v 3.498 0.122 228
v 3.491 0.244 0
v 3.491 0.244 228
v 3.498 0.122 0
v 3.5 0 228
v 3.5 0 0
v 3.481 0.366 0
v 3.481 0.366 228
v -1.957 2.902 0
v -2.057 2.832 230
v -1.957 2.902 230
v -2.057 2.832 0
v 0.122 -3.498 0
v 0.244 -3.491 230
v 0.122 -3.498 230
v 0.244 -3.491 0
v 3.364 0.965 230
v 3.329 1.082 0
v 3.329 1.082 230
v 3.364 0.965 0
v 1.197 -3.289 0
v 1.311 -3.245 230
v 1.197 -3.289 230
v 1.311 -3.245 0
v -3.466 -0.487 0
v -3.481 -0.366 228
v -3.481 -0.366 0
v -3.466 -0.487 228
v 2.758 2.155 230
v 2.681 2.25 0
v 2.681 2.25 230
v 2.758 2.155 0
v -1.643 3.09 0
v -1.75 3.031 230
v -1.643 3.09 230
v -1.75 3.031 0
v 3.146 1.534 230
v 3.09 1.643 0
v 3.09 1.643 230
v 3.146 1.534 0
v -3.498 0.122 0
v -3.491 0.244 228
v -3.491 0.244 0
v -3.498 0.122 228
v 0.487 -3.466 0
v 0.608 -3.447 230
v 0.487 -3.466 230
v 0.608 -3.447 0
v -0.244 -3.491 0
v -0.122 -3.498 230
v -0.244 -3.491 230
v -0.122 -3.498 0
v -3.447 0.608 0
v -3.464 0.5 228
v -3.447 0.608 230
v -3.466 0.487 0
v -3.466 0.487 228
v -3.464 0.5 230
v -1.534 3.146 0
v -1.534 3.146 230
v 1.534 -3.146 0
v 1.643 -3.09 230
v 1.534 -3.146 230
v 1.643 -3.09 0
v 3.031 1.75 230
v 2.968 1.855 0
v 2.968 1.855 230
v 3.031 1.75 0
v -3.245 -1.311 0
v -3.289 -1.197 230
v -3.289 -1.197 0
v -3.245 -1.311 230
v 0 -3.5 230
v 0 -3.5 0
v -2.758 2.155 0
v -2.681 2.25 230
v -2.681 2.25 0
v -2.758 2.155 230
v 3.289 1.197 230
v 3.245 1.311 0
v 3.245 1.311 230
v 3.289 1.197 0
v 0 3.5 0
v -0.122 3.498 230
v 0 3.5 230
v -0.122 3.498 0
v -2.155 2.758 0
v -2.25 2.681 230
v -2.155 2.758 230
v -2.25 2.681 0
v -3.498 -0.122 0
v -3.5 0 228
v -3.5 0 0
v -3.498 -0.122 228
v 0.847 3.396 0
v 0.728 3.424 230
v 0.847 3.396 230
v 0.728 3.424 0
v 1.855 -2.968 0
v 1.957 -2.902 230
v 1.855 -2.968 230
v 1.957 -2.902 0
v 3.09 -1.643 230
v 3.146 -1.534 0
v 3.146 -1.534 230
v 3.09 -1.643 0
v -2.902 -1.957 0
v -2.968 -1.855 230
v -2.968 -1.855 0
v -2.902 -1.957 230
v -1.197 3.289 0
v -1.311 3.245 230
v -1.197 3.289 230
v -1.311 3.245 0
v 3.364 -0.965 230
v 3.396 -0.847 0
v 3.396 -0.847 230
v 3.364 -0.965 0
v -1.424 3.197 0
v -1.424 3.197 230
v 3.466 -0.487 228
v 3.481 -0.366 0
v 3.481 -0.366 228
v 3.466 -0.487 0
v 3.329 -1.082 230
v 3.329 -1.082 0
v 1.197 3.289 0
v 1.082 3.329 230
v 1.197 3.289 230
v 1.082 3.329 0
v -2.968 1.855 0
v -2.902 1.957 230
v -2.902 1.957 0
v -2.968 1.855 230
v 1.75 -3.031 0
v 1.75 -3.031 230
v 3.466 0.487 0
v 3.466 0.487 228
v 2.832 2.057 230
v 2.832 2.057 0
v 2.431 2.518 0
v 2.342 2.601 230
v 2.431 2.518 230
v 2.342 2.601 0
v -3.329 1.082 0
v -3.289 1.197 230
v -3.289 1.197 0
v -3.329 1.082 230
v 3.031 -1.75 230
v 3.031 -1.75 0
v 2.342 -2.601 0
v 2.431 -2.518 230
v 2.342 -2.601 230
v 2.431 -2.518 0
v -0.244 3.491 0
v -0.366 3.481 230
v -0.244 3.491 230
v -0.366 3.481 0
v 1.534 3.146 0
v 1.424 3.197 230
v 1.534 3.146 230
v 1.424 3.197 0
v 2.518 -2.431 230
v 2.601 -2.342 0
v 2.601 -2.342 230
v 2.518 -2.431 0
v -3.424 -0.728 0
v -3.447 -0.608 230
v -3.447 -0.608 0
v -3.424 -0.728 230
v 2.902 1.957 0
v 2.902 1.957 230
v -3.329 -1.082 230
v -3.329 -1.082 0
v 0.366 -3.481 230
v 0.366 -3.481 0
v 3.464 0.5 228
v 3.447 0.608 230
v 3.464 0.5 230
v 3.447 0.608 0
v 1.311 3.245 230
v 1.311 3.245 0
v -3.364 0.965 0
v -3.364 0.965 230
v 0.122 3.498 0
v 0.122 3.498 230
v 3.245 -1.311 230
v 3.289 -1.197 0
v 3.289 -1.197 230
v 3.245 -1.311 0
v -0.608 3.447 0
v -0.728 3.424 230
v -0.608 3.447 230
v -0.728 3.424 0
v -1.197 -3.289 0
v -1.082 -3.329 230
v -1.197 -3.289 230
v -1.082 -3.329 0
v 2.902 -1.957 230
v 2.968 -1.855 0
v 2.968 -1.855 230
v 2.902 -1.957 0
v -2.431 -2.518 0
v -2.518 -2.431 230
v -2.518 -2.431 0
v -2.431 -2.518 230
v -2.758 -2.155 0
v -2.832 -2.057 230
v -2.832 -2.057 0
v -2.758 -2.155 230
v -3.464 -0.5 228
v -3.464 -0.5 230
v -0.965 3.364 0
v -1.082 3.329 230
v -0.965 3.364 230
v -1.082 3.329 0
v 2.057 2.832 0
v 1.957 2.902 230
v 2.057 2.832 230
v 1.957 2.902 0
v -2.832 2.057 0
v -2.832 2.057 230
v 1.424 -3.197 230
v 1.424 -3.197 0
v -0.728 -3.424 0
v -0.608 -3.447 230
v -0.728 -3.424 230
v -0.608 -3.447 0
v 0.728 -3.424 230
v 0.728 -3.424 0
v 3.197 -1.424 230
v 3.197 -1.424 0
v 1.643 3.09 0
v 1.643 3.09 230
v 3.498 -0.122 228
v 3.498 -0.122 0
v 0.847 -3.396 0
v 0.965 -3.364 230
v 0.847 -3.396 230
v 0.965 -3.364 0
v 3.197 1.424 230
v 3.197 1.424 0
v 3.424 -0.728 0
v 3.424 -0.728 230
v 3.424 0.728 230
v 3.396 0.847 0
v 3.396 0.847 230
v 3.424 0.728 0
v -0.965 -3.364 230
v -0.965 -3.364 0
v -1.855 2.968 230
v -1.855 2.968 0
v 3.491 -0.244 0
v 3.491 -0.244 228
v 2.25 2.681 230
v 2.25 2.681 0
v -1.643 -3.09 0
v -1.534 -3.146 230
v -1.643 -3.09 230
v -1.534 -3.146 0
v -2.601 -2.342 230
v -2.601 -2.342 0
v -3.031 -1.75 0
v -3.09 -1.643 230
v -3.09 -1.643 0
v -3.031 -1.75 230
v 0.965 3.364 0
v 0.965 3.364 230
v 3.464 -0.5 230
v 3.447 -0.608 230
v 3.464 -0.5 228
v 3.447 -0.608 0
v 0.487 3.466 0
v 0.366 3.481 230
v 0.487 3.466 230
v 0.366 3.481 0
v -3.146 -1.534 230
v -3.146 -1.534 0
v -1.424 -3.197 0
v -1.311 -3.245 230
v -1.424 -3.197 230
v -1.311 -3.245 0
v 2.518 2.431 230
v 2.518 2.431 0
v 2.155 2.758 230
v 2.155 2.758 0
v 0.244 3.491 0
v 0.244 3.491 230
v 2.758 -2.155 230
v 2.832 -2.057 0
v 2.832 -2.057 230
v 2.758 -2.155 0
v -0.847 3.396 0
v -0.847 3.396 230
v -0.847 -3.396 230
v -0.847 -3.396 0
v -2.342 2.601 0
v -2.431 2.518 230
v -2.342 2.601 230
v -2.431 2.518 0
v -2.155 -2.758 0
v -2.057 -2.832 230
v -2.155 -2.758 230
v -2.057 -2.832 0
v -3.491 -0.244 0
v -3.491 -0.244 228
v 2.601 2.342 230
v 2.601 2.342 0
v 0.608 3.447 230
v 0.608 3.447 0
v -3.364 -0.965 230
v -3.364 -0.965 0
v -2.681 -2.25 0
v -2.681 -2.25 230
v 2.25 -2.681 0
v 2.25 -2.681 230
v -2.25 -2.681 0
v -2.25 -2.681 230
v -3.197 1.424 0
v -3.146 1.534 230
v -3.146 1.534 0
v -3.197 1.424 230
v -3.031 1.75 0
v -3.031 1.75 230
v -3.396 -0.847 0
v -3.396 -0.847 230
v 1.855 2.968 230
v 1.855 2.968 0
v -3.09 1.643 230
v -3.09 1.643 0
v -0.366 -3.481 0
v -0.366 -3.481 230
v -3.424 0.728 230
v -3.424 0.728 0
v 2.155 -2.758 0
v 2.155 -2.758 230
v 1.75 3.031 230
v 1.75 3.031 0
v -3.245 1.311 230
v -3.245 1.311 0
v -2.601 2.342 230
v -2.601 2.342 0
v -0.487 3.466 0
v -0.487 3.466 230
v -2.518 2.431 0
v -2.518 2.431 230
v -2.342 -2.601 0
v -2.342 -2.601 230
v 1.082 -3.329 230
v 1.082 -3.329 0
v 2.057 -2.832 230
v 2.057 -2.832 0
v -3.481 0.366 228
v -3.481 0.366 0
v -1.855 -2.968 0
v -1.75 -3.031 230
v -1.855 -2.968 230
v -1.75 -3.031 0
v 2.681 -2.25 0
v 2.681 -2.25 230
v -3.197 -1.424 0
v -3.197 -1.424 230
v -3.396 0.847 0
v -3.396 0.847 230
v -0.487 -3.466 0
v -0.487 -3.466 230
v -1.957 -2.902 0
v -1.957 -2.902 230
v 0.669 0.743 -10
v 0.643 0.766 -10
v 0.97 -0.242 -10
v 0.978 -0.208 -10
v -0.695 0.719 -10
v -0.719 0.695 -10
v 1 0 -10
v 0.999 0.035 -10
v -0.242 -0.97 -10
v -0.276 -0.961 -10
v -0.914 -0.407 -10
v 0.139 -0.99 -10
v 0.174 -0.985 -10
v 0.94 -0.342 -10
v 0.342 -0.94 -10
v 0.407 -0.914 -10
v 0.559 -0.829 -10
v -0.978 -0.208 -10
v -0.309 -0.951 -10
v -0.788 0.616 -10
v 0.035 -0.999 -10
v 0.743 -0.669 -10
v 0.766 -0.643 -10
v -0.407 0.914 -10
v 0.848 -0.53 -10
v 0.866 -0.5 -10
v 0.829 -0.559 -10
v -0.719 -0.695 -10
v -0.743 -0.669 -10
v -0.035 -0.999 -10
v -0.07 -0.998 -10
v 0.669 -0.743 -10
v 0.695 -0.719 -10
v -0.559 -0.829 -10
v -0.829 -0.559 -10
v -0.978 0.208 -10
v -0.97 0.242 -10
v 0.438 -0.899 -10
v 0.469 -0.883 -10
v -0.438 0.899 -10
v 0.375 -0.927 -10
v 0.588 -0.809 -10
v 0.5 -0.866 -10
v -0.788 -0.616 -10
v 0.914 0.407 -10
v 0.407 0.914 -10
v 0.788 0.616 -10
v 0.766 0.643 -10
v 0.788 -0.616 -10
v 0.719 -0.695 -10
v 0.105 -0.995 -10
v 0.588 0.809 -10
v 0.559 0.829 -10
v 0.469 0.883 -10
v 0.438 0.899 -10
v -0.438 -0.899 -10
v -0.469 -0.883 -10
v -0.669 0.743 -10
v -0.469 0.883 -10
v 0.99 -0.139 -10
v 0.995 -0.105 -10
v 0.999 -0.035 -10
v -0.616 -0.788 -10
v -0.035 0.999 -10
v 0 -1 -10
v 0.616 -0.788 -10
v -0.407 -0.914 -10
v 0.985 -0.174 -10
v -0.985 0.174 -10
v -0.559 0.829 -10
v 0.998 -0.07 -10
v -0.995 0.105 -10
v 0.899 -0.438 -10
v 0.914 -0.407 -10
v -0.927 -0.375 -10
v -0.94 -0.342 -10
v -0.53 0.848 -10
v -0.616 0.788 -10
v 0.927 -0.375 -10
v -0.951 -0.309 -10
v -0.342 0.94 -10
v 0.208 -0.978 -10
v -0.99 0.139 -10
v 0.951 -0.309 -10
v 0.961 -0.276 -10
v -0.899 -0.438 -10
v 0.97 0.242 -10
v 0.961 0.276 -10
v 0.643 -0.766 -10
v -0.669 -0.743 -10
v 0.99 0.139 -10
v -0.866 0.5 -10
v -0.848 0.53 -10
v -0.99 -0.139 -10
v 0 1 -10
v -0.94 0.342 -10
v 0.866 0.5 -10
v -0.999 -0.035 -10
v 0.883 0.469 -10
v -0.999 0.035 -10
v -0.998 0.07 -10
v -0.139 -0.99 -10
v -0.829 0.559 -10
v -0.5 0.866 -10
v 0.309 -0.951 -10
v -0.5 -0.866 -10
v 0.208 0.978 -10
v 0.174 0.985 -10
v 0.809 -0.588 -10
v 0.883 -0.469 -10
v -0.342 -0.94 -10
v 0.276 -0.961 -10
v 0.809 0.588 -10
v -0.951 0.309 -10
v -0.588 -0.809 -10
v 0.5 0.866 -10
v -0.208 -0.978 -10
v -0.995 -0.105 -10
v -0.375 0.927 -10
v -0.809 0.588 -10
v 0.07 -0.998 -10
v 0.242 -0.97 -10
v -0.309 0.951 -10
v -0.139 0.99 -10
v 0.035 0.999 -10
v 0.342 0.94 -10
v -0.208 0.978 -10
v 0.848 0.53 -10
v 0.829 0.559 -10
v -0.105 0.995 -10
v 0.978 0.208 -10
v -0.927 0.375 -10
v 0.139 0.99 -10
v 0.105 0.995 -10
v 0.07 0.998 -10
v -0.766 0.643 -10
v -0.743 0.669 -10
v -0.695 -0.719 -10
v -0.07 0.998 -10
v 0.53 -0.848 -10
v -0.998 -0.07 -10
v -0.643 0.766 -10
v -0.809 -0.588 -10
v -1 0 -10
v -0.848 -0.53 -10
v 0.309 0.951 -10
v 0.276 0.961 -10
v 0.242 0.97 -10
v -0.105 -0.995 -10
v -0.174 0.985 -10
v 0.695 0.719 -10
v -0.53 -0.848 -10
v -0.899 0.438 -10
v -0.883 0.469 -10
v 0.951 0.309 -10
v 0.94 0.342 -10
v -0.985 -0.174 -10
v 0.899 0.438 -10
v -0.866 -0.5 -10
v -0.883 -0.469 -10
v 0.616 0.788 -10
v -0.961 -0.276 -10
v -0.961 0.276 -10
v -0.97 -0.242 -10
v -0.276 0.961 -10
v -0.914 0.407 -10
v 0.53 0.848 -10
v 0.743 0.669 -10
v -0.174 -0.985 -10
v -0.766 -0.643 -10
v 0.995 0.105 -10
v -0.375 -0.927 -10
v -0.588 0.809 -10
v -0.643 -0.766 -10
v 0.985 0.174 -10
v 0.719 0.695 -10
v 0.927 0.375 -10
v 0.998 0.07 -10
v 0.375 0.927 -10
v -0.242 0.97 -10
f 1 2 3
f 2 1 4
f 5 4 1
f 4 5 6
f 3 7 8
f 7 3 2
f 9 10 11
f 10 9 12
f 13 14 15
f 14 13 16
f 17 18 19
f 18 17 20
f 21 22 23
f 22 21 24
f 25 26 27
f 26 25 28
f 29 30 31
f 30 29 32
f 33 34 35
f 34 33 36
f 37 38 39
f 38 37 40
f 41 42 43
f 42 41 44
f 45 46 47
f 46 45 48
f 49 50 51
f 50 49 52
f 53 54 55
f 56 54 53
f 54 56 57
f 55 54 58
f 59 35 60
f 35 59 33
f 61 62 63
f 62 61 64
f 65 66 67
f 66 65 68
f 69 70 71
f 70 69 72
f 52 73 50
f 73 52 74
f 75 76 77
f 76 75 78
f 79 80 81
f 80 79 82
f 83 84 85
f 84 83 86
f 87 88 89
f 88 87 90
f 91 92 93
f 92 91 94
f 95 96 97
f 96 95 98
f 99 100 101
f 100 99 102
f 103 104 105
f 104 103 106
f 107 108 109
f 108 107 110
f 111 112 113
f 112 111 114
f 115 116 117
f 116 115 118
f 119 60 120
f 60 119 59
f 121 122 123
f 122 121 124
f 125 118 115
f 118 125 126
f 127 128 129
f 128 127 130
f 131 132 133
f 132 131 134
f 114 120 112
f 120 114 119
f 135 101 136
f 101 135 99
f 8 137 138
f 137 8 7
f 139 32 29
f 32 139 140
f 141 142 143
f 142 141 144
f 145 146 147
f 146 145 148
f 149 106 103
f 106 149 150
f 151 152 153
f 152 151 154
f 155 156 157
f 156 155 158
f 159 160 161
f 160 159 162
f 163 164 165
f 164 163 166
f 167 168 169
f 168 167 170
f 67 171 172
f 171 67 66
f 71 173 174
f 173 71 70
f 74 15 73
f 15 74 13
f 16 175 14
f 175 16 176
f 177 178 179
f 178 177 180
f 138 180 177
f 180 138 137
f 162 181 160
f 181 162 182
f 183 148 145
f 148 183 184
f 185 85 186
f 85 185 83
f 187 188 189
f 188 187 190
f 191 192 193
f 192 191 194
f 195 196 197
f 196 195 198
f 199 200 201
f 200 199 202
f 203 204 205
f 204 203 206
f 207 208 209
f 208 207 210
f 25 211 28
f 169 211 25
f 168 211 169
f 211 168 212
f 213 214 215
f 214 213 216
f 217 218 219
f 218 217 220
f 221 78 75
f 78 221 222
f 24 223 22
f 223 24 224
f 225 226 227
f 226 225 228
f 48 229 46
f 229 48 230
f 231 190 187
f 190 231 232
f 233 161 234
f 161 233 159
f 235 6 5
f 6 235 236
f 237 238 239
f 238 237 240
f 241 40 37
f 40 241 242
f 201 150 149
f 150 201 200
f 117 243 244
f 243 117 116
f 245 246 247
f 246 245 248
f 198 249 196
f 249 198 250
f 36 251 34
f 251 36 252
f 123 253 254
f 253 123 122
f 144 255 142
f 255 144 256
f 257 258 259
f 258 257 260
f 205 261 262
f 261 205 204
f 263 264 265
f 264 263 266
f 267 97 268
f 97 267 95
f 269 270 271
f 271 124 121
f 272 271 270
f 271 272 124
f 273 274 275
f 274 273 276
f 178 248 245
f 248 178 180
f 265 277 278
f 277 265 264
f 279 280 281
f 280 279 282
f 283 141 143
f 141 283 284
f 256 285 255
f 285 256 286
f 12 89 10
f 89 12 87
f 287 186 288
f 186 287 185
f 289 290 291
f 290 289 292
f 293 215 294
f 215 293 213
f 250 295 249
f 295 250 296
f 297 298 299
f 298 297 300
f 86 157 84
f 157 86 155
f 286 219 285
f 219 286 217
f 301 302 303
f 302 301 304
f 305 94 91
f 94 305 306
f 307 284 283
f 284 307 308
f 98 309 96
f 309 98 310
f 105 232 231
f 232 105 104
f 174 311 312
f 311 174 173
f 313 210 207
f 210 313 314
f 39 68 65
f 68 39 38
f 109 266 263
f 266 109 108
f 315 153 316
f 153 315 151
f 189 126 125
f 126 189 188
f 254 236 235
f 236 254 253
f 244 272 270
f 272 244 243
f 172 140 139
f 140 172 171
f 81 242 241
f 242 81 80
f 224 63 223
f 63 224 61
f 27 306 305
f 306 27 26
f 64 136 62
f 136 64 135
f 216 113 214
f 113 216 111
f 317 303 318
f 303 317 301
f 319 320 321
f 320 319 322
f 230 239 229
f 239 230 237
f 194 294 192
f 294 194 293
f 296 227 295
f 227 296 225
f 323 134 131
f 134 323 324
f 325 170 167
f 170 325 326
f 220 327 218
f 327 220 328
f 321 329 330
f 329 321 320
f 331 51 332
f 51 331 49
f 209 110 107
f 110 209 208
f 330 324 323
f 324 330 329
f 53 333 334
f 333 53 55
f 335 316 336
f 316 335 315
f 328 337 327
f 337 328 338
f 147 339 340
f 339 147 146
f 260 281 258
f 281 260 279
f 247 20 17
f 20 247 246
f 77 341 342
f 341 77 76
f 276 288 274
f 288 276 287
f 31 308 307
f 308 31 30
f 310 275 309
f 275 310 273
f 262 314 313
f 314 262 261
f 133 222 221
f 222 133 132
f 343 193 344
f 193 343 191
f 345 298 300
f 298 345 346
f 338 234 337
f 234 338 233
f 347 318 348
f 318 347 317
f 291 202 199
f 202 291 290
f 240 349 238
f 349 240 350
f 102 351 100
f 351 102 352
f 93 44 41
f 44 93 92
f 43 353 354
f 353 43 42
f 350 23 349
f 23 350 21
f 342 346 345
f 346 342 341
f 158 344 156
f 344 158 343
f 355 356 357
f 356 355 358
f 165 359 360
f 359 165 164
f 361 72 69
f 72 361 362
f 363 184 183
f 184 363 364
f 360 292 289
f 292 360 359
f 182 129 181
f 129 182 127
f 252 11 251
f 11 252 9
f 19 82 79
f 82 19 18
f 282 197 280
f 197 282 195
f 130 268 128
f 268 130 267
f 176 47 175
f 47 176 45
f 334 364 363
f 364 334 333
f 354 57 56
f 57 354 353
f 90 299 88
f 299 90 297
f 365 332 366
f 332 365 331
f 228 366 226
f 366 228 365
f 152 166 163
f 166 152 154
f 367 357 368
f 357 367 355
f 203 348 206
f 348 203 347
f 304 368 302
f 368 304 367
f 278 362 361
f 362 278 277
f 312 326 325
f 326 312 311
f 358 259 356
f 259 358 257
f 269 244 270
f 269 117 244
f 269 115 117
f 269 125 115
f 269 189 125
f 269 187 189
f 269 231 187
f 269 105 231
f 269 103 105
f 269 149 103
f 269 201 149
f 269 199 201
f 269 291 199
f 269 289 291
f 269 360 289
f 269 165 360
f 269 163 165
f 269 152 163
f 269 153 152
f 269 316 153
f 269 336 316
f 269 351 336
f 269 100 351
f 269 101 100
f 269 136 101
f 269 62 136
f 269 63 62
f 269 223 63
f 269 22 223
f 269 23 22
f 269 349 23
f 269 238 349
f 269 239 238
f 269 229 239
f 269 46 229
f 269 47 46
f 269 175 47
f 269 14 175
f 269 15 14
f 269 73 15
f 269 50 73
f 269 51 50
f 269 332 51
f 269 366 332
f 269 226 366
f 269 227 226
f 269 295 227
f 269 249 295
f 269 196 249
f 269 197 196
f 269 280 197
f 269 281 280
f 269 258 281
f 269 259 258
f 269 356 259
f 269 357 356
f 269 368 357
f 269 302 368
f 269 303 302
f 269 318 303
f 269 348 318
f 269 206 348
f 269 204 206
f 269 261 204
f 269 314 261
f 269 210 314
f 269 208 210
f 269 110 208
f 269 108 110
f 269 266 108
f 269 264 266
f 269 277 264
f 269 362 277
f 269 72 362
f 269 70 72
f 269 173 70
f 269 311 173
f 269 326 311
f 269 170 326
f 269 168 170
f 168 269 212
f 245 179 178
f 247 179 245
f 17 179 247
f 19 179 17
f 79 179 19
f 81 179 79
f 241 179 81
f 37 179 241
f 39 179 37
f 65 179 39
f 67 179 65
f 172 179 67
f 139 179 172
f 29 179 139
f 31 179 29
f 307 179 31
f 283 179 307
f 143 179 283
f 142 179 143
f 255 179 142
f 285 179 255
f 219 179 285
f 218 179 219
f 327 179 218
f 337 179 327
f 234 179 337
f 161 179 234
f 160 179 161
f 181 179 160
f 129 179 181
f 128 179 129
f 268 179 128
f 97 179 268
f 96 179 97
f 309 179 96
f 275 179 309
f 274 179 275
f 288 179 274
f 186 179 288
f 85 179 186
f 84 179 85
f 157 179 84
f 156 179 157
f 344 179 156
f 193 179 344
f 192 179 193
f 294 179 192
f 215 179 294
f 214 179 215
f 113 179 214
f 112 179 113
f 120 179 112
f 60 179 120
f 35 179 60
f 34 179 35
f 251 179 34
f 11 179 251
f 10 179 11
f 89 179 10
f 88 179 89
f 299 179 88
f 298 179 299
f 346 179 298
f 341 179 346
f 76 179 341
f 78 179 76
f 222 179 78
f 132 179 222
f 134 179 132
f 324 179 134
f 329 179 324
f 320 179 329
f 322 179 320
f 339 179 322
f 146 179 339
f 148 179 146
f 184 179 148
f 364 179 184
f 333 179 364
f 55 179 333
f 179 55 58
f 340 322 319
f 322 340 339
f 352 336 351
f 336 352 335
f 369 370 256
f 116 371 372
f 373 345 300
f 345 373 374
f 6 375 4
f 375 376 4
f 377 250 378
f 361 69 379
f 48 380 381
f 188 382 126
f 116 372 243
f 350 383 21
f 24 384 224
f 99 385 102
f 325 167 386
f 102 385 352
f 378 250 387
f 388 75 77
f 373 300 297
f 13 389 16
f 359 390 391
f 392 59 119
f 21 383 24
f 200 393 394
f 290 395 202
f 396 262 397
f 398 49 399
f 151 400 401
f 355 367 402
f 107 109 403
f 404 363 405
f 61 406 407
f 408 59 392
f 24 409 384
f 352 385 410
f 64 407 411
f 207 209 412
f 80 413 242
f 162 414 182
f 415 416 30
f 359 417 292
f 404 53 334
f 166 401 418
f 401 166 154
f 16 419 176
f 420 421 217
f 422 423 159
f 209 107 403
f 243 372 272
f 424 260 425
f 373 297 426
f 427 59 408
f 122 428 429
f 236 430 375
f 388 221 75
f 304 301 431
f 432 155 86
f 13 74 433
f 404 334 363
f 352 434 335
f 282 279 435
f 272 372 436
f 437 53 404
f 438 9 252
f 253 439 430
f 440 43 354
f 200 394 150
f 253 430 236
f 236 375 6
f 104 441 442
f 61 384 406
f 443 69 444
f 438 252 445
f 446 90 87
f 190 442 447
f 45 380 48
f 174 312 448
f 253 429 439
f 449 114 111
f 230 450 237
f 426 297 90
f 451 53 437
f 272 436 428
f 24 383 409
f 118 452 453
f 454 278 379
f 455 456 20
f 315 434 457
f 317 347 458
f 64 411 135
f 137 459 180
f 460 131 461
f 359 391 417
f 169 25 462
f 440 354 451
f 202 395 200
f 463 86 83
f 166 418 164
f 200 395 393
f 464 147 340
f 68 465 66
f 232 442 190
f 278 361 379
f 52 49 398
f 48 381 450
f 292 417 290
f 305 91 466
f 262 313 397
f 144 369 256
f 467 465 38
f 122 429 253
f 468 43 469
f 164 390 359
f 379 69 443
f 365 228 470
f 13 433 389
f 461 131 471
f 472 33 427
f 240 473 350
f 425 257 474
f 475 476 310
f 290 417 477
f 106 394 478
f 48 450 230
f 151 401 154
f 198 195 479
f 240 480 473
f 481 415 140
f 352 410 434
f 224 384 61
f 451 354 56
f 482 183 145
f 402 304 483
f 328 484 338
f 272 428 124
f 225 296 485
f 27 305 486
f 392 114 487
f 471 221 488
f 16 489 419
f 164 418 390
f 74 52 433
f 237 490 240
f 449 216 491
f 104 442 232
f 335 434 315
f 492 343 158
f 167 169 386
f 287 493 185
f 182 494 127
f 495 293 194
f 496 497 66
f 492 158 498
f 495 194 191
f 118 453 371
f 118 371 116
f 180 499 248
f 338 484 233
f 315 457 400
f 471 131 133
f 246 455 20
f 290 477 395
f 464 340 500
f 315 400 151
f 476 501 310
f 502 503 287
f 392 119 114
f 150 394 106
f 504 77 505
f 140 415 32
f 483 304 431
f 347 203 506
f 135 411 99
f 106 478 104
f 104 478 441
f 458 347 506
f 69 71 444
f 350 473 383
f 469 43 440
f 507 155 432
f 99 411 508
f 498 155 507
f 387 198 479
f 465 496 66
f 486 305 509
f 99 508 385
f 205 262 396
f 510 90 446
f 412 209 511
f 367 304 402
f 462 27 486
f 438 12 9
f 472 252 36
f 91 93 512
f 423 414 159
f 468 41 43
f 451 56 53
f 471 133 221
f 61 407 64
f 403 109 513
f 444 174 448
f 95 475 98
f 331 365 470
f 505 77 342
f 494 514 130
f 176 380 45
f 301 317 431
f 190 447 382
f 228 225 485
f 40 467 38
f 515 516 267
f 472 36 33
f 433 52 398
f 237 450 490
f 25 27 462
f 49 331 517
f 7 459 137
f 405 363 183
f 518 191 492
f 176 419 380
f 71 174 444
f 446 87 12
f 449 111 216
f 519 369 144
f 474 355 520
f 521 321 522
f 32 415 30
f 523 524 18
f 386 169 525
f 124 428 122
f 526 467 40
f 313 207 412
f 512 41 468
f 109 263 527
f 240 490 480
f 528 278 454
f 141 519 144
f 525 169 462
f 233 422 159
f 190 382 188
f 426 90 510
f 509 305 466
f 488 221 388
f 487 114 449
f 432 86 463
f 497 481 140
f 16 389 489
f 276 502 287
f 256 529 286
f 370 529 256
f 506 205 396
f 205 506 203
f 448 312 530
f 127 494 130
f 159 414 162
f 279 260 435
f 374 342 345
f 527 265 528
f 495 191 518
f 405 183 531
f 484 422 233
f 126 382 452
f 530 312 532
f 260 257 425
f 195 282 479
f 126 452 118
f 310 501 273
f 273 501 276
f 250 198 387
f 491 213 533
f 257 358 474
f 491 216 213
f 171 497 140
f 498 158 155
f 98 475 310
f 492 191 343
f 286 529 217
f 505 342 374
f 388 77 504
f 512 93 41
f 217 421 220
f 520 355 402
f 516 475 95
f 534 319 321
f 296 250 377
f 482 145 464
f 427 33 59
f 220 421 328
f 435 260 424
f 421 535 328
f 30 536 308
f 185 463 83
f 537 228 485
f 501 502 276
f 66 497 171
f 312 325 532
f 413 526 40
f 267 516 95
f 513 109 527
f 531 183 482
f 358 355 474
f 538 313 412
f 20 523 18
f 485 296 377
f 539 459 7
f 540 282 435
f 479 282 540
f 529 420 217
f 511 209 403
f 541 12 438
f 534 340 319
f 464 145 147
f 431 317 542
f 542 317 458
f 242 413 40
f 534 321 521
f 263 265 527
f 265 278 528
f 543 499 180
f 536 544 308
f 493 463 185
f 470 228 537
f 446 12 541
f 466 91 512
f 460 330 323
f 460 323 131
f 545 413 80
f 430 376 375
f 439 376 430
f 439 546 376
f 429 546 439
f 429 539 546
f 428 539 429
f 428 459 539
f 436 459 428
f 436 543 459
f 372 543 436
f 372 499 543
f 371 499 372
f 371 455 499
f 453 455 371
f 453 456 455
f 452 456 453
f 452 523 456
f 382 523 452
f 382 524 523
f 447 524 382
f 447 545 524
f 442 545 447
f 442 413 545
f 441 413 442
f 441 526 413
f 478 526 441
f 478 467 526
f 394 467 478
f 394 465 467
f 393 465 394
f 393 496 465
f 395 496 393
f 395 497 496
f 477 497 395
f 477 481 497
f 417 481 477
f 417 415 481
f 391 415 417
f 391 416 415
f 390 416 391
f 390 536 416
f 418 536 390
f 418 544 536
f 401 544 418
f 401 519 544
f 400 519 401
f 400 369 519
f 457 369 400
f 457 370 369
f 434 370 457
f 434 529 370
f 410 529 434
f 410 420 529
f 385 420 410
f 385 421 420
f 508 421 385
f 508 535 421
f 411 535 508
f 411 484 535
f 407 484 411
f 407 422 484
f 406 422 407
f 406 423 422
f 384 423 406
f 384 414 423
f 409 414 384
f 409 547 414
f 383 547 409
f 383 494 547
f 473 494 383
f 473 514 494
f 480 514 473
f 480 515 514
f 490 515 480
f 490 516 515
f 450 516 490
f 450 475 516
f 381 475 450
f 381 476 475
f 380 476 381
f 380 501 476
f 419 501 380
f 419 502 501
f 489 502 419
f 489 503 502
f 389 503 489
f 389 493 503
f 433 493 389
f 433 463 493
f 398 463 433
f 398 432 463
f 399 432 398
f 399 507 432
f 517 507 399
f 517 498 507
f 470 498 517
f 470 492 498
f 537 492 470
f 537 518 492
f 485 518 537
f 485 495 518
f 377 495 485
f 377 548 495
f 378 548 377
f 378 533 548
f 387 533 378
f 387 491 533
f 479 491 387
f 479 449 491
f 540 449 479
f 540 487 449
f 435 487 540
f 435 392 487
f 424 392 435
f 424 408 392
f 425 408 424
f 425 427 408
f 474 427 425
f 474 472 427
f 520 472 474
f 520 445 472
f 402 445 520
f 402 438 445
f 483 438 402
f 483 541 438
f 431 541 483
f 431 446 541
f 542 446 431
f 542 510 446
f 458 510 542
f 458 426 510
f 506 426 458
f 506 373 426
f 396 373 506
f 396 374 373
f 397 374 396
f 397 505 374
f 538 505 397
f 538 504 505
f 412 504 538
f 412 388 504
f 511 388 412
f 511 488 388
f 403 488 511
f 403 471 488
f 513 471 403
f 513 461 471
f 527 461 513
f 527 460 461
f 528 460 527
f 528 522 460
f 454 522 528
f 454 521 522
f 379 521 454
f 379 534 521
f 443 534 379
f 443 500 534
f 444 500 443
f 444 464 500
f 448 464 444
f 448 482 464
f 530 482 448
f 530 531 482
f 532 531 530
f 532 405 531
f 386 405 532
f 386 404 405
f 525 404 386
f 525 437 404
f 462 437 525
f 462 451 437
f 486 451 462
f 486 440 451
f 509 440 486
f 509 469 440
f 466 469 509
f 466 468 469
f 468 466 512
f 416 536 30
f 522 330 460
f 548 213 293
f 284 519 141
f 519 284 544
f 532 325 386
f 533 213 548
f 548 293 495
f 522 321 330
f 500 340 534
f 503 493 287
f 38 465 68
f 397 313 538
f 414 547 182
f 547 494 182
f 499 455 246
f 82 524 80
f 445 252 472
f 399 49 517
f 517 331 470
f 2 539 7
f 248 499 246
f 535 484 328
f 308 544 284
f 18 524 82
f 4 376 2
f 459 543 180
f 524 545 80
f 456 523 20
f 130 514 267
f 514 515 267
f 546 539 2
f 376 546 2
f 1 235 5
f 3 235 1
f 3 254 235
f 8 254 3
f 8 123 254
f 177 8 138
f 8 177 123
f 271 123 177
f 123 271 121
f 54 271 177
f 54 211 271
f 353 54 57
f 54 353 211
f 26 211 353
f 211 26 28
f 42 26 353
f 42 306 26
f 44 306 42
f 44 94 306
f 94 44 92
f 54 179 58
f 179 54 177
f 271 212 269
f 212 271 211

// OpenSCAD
$fn = 180;

difference() {
    arrow();
    translate([-5, -0.5, 228]) cube([10, 1, 10]);
}

module arrow() {
    cylinder(h = 230, d = 7);
    translate([0, 0, -10]) cylinder(h = 10, d1 = 2, d2 = 7);
}
